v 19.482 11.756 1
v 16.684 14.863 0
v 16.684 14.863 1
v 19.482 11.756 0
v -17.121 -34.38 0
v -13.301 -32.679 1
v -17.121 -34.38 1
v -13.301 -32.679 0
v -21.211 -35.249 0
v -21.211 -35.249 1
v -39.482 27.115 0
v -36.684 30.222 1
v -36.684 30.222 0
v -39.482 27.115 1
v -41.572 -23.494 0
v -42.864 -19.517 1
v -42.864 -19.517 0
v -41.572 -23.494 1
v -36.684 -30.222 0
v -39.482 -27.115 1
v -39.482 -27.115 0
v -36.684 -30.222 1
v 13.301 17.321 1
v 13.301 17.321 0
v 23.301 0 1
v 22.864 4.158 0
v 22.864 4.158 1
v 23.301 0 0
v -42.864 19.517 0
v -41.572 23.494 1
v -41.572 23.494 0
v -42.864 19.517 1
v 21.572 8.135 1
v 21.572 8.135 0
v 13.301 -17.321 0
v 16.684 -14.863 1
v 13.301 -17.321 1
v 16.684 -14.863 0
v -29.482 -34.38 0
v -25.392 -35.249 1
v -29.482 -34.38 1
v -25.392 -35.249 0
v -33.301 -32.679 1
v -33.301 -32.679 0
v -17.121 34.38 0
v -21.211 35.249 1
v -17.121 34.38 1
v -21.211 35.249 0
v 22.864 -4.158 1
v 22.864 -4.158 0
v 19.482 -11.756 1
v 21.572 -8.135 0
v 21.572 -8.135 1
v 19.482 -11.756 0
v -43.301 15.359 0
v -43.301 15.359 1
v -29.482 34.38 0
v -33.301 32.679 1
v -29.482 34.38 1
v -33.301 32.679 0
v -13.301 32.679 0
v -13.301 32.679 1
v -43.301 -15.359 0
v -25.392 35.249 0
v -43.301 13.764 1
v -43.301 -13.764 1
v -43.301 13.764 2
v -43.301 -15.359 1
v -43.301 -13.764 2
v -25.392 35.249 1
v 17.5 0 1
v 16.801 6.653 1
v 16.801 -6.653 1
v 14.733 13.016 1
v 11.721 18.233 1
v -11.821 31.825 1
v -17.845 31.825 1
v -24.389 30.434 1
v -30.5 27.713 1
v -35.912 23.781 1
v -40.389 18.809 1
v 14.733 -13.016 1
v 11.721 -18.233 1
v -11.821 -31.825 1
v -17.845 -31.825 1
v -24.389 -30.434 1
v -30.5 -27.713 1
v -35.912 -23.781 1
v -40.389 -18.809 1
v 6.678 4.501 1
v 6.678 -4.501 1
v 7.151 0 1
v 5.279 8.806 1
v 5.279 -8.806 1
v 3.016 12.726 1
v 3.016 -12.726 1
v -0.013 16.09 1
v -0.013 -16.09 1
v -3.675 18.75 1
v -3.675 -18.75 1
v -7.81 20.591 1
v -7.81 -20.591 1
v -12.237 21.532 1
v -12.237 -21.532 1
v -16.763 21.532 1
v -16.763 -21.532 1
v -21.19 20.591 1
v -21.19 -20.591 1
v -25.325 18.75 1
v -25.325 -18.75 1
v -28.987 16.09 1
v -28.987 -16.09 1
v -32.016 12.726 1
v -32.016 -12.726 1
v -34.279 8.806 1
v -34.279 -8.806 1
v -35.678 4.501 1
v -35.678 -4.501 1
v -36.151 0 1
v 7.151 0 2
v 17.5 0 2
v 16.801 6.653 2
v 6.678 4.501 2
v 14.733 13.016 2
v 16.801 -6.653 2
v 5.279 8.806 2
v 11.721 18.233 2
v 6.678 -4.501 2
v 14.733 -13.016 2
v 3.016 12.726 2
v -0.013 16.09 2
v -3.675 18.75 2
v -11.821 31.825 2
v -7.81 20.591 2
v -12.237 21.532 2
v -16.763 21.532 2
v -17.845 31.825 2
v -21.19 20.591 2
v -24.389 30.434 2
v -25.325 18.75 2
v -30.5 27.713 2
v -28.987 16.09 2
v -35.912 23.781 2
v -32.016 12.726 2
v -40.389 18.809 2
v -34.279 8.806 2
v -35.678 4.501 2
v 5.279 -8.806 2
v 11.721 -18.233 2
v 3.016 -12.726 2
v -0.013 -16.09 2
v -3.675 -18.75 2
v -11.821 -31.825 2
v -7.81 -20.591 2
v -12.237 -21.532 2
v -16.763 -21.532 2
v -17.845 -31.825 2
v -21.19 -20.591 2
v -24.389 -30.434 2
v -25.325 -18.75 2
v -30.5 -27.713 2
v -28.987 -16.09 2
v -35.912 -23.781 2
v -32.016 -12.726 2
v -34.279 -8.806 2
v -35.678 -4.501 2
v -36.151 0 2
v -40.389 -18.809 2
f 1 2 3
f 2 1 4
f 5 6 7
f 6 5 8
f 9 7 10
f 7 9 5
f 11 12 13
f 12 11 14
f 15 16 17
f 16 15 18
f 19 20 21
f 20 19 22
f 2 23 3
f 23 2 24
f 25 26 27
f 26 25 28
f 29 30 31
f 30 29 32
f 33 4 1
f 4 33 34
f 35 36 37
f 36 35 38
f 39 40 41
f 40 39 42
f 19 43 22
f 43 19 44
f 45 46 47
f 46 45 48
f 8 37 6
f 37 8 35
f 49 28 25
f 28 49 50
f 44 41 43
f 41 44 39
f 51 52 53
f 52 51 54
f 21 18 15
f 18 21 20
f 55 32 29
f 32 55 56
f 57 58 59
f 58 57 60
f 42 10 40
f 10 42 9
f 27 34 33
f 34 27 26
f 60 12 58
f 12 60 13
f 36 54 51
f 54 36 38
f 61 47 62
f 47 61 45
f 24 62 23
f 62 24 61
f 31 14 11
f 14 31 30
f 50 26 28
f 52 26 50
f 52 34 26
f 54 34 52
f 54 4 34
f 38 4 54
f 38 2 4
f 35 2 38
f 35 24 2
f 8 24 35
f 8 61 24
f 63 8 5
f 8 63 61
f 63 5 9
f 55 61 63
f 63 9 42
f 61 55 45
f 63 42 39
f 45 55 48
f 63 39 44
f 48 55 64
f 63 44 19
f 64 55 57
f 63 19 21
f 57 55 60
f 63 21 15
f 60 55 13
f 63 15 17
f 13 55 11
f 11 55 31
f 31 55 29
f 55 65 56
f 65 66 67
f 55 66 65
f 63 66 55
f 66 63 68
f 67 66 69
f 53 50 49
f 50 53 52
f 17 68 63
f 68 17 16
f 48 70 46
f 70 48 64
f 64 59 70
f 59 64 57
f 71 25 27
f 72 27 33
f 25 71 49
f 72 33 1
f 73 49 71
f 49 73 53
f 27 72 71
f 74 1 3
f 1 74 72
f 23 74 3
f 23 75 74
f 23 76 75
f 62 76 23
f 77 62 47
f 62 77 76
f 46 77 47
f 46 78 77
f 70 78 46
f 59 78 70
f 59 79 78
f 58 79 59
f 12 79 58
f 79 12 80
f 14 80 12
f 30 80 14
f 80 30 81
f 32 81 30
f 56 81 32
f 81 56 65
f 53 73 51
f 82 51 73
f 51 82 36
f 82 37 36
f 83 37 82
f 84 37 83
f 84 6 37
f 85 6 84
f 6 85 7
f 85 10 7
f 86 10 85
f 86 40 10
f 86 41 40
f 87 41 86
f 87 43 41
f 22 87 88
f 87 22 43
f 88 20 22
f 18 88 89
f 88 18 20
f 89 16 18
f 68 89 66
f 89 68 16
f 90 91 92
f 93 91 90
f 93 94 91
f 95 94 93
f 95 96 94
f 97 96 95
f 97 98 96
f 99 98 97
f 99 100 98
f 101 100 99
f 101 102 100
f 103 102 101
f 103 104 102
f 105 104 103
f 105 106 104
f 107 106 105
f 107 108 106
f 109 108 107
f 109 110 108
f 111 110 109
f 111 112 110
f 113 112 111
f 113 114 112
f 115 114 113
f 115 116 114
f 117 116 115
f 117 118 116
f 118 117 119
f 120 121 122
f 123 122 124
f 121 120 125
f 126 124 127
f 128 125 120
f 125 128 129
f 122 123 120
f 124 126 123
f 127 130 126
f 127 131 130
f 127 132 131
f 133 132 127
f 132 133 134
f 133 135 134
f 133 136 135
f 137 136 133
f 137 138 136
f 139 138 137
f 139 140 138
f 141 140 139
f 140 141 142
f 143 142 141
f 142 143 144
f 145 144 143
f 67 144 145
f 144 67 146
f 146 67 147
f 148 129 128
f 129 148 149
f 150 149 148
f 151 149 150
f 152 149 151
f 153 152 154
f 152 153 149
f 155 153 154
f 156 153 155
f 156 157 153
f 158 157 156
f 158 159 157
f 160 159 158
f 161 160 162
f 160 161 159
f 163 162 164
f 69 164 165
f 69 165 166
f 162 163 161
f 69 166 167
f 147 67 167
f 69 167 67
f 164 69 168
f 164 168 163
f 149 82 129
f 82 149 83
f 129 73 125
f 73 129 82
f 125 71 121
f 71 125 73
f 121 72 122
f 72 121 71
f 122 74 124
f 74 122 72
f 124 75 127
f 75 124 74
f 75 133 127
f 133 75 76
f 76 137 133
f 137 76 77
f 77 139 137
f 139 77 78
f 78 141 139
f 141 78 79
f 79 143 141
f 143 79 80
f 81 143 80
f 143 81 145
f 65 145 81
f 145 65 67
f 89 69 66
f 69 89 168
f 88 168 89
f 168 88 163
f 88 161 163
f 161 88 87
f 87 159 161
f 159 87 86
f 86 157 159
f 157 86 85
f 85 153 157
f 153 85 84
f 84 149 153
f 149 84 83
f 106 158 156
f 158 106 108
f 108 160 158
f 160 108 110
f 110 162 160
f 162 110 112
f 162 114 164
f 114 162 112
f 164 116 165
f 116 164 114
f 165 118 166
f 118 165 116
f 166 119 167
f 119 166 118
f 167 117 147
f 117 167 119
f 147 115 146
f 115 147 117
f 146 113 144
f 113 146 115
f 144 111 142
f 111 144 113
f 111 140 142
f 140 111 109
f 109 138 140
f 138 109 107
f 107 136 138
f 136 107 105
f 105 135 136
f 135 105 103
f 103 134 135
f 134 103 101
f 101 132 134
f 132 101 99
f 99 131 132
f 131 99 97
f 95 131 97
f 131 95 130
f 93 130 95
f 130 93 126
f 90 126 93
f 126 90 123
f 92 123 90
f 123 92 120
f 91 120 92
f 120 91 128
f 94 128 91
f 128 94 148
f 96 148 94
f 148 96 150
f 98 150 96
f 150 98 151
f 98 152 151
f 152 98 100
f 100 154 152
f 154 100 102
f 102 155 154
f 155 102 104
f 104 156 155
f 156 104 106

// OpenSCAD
midPoint = 50 * sqrt(3);
module triangle()
{
    polygon(points = [
        [ 0, 0 ],
        [ midPoint, 50 ],
        [ 0, 100 ],
    ]);
}
 linear_extrude(1)
translate([ -(50 * sqrt(3)) / 2, -50, 0 ]) offset(20) offset(-40) offset(20) triangle();

translate([ 0, 0, 1 ])
linear_extrude(1)
difference()
{
    {
        translate([ -(50 * sqrt(3)) / 2, -50, 0 ]) offset(20) offset(-40) offset(20) triangle();
        translate([ -14.5, 0, 0 ]) circle(midPoint / 4);
        difference()
        {

            translate([ -14.5, 0, 0 ]) circle(100);
            translate([ -14.5, 0, 0 ]) circle(32);
        }
    }
}
